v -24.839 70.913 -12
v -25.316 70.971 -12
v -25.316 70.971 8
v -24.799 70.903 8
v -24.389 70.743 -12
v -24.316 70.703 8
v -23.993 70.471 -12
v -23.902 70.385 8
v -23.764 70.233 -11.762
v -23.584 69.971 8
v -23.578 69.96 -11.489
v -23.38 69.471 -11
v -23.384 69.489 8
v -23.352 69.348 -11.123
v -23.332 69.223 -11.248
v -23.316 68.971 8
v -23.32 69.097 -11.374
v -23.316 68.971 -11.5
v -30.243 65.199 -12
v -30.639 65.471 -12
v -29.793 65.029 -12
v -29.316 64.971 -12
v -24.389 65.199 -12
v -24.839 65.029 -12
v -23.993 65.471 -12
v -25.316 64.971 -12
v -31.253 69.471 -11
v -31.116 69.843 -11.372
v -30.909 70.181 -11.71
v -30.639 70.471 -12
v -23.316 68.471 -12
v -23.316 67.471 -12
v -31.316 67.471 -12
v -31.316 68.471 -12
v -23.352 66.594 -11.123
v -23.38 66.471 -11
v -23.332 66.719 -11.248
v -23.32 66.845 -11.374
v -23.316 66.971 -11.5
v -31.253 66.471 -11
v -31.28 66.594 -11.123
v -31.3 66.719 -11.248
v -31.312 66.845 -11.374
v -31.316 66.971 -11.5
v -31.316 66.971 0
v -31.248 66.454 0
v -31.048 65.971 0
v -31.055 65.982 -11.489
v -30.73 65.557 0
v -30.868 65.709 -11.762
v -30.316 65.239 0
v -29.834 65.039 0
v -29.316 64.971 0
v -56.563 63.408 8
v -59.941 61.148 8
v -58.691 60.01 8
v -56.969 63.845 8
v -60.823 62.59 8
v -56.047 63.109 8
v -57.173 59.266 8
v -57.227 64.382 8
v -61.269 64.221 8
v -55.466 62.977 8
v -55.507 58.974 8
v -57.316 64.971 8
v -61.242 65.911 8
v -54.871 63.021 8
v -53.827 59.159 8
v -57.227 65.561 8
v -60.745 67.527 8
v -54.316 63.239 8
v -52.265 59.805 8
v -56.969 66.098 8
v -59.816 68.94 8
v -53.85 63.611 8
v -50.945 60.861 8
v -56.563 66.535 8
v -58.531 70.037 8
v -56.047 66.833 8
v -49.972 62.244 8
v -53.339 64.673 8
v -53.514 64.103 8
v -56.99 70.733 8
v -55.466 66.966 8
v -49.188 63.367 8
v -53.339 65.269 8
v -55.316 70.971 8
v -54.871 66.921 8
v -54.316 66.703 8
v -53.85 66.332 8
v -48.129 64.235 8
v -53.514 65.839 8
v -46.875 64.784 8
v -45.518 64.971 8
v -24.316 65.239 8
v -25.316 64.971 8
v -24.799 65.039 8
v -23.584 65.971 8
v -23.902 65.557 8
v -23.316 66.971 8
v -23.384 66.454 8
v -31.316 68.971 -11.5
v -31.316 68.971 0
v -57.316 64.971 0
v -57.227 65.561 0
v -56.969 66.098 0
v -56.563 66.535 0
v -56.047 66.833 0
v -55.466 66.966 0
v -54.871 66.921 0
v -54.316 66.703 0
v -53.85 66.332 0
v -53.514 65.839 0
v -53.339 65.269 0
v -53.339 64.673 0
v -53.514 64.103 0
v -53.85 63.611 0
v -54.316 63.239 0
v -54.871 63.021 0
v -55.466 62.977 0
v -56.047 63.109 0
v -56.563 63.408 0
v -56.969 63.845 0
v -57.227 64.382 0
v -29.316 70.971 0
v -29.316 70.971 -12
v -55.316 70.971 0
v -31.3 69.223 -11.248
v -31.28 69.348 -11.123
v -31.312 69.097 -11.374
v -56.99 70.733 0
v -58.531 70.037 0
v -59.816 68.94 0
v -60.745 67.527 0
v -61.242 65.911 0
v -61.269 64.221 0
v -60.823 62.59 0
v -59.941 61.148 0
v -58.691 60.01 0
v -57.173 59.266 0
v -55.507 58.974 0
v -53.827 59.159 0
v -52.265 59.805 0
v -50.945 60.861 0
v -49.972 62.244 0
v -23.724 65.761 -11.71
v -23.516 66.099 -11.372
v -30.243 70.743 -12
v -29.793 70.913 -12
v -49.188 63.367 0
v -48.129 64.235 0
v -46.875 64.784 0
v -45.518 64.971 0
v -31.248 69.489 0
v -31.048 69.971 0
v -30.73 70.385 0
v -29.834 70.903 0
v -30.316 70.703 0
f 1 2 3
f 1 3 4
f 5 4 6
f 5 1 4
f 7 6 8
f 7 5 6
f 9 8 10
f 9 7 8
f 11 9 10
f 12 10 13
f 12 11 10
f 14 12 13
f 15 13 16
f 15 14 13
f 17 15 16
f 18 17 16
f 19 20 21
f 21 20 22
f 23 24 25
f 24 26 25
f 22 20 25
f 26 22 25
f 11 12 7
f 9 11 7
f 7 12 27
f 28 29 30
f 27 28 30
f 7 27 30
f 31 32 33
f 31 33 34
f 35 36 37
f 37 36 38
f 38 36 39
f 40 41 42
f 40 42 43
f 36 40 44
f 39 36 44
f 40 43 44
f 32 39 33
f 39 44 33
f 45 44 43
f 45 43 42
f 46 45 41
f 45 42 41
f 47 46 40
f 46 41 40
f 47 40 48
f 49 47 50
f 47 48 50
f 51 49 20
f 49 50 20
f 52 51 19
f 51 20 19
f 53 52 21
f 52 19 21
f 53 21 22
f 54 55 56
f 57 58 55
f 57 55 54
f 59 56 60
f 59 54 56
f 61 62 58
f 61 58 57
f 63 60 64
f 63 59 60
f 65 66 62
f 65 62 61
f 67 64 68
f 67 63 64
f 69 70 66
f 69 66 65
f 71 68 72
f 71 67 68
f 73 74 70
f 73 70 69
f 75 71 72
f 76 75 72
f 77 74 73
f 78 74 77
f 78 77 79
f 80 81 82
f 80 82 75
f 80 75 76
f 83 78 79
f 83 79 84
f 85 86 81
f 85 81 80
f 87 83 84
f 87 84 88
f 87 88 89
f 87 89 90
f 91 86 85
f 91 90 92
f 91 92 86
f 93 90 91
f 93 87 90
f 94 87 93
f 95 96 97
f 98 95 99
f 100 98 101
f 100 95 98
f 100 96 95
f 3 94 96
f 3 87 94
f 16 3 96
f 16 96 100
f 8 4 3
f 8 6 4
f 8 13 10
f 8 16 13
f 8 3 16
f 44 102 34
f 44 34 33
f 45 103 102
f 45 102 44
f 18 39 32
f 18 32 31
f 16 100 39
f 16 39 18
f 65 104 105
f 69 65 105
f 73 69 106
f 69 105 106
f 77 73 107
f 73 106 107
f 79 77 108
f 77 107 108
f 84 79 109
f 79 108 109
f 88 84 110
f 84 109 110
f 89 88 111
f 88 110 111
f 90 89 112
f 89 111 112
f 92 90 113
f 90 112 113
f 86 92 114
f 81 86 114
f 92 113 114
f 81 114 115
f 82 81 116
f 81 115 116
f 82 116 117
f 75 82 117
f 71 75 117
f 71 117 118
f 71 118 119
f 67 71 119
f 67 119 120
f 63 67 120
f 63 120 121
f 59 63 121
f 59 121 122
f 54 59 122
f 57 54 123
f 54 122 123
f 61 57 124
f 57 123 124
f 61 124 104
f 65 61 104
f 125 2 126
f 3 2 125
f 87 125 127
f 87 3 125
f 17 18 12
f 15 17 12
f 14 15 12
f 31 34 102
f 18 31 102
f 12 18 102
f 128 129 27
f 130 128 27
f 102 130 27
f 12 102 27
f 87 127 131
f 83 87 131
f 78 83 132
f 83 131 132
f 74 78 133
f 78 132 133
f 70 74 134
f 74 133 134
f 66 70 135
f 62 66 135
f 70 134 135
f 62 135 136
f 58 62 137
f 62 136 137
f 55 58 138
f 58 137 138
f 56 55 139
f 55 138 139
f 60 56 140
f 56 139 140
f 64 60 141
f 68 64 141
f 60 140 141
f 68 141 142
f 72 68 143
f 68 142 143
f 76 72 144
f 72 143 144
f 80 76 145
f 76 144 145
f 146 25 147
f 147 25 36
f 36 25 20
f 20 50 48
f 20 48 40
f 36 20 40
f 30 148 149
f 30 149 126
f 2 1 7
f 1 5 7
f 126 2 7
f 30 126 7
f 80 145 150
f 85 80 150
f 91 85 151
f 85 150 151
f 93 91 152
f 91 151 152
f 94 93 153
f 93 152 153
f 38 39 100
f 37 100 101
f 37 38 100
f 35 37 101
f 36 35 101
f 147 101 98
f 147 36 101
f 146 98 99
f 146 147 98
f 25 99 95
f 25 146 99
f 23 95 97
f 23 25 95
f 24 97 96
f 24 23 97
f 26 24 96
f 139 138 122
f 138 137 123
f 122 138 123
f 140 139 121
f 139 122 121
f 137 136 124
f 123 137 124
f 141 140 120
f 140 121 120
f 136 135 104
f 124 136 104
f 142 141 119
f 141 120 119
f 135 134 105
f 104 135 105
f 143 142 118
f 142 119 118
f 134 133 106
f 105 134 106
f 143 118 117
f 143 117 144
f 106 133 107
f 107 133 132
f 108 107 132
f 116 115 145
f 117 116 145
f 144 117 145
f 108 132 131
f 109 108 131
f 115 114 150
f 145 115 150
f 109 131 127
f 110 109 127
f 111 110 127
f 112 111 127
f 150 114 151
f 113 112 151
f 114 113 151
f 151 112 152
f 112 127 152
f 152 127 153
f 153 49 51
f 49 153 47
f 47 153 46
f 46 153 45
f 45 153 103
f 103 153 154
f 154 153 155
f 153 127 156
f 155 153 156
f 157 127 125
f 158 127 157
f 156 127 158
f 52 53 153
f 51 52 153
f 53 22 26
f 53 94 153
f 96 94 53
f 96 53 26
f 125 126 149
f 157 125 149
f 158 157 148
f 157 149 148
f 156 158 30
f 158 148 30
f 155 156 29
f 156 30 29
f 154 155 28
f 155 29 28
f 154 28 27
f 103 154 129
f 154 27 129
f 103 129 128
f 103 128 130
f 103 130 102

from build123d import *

# Parameters (mm, degrees)
BOSS_EXTRUDE1_DEPTH = 8
BOSS_EXTRUDE2_DEPTH = 12
SKETCH3_R           = 2
CUT_EXTRUDE1_DEPTH  = 8
FILLET1_R           = 2
CUT_EXTRUDE2_DEPTH  = 8


with BuildPart() as part:
    # Sketch1 → Boss-Extrude1 (new body)
    with BuildSketch(Plane.XY):
        with BuildLine():
            Line((-23.31623588, 68.971177363), (-23.31623588, 70.971177363))
            Line((-23.31623588, 70.971177363), (-55.31623588, 70.971177363))
            ThreePointArc((-55.31623588, 70.971177363), (-60.433053073, 61.837779556), (-49.971894623, 62.243904636))
            ThreePointArc((-49.971894623, 62.243904636), (-48.129441748, 64.23519169), (-45.518276909, 64.971177363))
            Line((-45.518276909, 64.971177363), (-23.31623588, 64.971177363))
            Line((-23.31623588, 64.971177363), (-23.31623588, 68.971177363))
        make_face()
    extrude(amount=BOSS_EXTRUDE1_DEPTH)

    # Sketch2 → Boss-Extrude2 (add)
    with BuildSketch(Plane.XY):
        Polygon((-23.31623588, 68.971177363), (-23.31623588, 70.971177363), (-31.31623588, 70.971177363), (-31.31623588, 67.971177363), (-31.31623588, 64.971177363), (-23.31623588, 64.971177363), align=None)
    extrude(amount=-BOSS_EXTRUDE2_DEPTH)

    # Sketch3 → Cut-Extrude1 (cut)
    with BuildSketch(Plane(origin=(0, 0, 0), x_dir=(-1, 0, 0), z_dir=(0, 0, -1))):
        with Locations((55.31623588, 64.971177363)):
            Circle(SKETCH3_R)
    extrude(amount=-CUT_EXTRUDE1_DEPTH, mode=Mode.SUBTRACT)

    # Fillet1
    fillet1_edges = [part.edges().sort_by_distance(p)[0] for p in [
        (-31.31623588, 70.971177363, -6),
        (-31.31623588, 64.971177363, -6),
        (-23.31623588, 64.971177363, -2),
        (-23.31623588, 70.971177363, -2),
    ]]
    fillet(fillet1_edges, radius=FILLET1_R)

    # Sketch4 → Cut-Extrude2 (cut)
    with BuildSketch(Plane.ZY.offset(31.31623588)):
        Polygon((-12, 70.971177363), (-13, 70.971177363), (-13, 64.971177363), (-12, 64.971177363), (-12, 65.471177363), (-11, 66.471177363), (-12, 67.471177363), (-12, 68.471177363), (-11, 69.471177363), (-12, 70.471177363), align=None)
    extrude(amount=-CUT_EXTRUDE2_DEPTH, mode=Mode.SUBTRACT)


solid = part.part
